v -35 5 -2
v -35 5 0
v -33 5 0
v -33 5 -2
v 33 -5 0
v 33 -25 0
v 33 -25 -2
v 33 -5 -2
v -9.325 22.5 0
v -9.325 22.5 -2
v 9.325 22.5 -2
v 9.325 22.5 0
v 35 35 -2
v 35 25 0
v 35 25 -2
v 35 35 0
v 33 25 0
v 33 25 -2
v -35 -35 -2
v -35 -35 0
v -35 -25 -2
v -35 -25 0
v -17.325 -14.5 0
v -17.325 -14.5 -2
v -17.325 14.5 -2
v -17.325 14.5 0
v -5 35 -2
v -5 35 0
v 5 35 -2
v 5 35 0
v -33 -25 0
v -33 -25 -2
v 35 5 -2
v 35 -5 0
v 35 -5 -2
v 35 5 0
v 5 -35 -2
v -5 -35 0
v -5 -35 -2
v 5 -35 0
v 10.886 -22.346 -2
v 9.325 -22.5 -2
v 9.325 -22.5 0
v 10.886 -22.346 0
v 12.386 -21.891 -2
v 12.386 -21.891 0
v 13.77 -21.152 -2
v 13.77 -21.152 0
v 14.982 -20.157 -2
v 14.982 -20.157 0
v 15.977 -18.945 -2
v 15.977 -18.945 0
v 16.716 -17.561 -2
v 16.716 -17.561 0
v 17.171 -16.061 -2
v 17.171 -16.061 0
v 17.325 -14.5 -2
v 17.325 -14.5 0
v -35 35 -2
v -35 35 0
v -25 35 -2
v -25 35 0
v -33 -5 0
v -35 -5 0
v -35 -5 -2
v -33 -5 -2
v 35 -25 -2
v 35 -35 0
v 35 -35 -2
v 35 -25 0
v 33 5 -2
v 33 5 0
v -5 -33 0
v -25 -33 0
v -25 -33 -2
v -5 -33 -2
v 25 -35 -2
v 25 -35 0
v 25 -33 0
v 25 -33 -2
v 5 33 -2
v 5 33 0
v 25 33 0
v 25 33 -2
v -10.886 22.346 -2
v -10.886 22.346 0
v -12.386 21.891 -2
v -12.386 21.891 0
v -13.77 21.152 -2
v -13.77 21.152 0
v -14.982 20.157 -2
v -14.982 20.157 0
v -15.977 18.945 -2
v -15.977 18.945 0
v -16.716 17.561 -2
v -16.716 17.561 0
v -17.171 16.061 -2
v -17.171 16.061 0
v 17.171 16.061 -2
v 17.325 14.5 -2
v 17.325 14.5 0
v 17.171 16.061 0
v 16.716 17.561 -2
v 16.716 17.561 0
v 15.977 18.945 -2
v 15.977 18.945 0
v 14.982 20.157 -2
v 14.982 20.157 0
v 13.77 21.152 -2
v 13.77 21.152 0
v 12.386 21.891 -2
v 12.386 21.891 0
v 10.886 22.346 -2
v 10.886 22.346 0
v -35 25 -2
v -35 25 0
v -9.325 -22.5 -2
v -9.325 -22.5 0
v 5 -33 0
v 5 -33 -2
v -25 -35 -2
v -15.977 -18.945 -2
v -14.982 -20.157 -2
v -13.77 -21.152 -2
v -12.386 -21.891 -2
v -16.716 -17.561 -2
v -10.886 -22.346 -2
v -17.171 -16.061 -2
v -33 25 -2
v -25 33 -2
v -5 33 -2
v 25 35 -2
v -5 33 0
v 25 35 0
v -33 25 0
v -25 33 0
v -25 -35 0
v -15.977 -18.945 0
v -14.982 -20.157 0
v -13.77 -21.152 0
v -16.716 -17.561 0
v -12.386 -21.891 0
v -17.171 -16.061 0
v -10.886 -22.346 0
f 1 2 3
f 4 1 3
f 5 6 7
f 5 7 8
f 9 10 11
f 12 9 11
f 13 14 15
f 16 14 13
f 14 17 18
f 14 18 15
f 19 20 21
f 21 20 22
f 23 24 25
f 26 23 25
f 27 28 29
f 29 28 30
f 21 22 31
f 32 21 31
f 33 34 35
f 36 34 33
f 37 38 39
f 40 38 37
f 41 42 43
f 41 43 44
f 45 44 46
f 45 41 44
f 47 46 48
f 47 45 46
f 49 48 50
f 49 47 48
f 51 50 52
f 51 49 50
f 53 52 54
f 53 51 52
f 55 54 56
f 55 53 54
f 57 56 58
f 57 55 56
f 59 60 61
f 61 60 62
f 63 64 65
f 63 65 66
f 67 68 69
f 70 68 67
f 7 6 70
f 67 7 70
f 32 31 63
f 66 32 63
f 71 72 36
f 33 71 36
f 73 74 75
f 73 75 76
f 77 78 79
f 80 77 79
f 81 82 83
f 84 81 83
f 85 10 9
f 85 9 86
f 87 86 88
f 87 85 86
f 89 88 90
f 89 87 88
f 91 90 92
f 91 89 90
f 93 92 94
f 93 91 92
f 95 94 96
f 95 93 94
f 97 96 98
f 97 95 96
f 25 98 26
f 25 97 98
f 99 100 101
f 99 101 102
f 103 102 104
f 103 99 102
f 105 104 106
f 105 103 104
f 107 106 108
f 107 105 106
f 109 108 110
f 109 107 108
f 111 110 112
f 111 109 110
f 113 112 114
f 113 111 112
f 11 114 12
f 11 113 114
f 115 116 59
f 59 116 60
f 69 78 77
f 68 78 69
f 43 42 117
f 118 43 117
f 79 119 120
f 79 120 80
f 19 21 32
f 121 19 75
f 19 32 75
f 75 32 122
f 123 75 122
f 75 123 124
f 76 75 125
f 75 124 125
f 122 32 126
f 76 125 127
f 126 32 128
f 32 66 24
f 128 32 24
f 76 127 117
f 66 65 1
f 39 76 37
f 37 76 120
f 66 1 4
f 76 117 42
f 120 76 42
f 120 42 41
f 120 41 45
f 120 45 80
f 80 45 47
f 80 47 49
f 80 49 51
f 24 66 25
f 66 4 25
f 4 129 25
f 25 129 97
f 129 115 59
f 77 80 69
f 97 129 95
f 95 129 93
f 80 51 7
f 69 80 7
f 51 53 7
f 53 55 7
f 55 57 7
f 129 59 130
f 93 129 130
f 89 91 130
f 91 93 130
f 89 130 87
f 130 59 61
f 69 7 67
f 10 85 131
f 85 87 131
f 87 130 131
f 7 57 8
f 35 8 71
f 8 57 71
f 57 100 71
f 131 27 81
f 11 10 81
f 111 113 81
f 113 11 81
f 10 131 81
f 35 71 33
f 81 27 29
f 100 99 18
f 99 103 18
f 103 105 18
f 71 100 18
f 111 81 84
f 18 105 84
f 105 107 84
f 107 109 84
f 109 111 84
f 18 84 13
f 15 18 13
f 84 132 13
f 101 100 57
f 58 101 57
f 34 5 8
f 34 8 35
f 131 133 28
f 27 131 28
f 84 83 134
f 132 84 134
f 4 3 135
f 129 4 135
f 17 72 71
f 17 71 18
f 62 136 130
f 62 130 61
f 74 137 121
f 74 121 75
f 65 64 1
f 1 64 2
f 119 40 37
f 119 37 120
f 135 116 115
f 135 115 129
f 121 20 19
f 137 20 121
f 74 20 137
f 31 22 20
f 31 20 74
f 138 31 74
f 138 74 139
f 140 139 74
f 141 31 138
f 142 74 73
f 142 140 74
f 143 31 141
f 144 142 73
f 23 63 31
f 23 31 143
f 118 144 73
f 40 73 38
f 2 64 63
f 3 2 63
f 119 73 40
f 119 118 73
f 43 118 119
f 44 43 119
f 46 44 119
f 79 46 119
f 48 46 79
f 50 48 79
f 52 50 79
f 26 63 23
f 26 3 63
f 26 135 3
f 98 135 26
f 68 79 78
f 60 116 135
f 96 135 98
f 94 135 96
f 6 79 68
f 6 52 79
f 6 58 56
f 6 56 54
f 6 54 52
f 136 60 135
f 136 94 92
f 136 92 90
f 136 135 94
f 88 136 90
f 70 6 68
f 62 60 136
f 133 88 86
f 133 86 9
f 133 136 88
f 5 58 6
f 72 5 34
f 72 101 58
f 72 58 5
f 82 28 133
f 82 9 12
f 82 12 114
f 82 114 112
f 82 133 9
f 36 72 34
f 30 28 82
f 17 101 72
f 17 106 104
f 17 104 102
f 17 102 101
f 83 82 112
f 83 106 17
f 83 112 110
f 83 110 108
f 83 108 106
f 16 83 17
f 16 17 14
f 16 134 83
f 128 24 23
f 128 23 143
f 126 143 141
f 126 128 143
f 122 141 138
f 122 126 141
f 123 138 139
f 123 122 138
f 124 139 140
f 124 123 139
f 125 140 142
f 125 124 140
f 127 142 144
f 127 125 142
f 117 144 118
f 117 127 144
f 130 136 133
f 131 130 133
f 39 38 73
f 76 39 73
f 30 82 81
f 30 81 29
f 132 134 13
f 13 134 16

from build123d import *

# Parameters (mm, degrees)
SKETCH1_W           = 70
SKETCH1_H           = 70
BOSS_EXTRUDE1_DEPTH = 2
SKETCH2_W           = 2
SKETCH2_H           = 20
SKETCH2_W_2         = 20
SKETCH2_H_2         = 2
CUT_EXTRUDE1_DEPTH  = 2
CUT_EXTRUDE2_DEPTH  = 10


with BuildPart() as part:
    # Sketch1 → Boss-Extrude1 (new body)
    with BuildSketch(Plane.XY):
        Rectangle(SKETCH1_W, SKETCH1_H)
    extrude(amount=-BOSS_EXTRUDE1_DEPTH)

    # Sketch2 → Cut-Extrude1 (cut)
    with BuildSketch(Plane.XY):
        with Locations((-34, 15)):
            Rectangle(SKETCH2_W, SKETCH2_H)
        with Locations((-34, -15)):
            Rectangle(SKETCH2_W, SKETCH2_H)
        with Locations((-15, -34)):
            Rectangle(SKETCH2_W_2, SKETCH2_H_2)
        with Locations((15, -34)):
            Rectangle(SKETCH2_W_2, SKETCH2_H_2)
        with Locations((34, -15)):
            Rectangle(SKETCH2_W, SKETCH2_H)
        with Locations((34, 15)):
            Rectangle(SKETCH2_W, SKETCH2_H)
        with Locations((15, 34)):
            Rectangle(SKETCH2_W_2, SKETCH2_H_2)
        with Locations((-15, 34)):
            Rectangle(SKETCH2_W_2, SKETCH2_H_2)
    extrude(amount=-CUT_EXTRUDE1_DEPTH, mode=Mode.SUBTRACT)

    # Sketch6 → Cut-Extrude2 (cut)
    with BuildSketch(Plane(origin=(0, 0, -2), x_dir=(-1, 0, 0), z_dir=(0, 0, -1))):
        Polygon((-9.325, -14.5), (-9.325, -22.5), (9.325, -22.5), (9.325, -14.5), (17.325, -14.5), (17.325, 14.5), (9.325, 14.5), (9.325, 22.5), (-9.325, 22.5), (-9.325, 14.5), (-17.325, 14.5), (-17.325, -14.5), align=None)
        with BuildLine():
            Line((-9.325, 22.5), (-9.325, 14.5))
            Line((-9.325, 14.5), (-17.325, 14.5))
            ThreePointArc((-17.325, 14.5), (-14.981854249, 20.156854249), (-9.325, 22.5))
        make_face()
        with BuildLine():
            ThreePointArc((9.325, 22.5), (14.981854249, 20.156854249), (17.325, 14.5))
            Line((17.325, 14.5), (9.325, 14.5))
            Line((9.325, 14.5), (9.325, 22.5))
        make_face()
        with BuildLine():
            ThreePointArc((-9.325, -22.5), (-14.981854249, -20.156854249), (-17.325, -14.5))
            Line((-17.325, -14.5), (-9.325, -14.5))
            Line((-9.325, -14.5), (-9.325, -22.5))
        make_face()
        with BuildLine():
            Line((9.325, -22.5), (9.325, -14.5))
            Line((9.325, -14.5), (17.325, -14.5))
            ThreePointArc((17.325, -14.5), (14.981854249, -20.156854249), (9.325, -22.5))
        make_face()
    extrude(amount=-CUT_EXTRUDE2_DEPTH, mode=Mode.SUBTRACT)


solid = part.part
